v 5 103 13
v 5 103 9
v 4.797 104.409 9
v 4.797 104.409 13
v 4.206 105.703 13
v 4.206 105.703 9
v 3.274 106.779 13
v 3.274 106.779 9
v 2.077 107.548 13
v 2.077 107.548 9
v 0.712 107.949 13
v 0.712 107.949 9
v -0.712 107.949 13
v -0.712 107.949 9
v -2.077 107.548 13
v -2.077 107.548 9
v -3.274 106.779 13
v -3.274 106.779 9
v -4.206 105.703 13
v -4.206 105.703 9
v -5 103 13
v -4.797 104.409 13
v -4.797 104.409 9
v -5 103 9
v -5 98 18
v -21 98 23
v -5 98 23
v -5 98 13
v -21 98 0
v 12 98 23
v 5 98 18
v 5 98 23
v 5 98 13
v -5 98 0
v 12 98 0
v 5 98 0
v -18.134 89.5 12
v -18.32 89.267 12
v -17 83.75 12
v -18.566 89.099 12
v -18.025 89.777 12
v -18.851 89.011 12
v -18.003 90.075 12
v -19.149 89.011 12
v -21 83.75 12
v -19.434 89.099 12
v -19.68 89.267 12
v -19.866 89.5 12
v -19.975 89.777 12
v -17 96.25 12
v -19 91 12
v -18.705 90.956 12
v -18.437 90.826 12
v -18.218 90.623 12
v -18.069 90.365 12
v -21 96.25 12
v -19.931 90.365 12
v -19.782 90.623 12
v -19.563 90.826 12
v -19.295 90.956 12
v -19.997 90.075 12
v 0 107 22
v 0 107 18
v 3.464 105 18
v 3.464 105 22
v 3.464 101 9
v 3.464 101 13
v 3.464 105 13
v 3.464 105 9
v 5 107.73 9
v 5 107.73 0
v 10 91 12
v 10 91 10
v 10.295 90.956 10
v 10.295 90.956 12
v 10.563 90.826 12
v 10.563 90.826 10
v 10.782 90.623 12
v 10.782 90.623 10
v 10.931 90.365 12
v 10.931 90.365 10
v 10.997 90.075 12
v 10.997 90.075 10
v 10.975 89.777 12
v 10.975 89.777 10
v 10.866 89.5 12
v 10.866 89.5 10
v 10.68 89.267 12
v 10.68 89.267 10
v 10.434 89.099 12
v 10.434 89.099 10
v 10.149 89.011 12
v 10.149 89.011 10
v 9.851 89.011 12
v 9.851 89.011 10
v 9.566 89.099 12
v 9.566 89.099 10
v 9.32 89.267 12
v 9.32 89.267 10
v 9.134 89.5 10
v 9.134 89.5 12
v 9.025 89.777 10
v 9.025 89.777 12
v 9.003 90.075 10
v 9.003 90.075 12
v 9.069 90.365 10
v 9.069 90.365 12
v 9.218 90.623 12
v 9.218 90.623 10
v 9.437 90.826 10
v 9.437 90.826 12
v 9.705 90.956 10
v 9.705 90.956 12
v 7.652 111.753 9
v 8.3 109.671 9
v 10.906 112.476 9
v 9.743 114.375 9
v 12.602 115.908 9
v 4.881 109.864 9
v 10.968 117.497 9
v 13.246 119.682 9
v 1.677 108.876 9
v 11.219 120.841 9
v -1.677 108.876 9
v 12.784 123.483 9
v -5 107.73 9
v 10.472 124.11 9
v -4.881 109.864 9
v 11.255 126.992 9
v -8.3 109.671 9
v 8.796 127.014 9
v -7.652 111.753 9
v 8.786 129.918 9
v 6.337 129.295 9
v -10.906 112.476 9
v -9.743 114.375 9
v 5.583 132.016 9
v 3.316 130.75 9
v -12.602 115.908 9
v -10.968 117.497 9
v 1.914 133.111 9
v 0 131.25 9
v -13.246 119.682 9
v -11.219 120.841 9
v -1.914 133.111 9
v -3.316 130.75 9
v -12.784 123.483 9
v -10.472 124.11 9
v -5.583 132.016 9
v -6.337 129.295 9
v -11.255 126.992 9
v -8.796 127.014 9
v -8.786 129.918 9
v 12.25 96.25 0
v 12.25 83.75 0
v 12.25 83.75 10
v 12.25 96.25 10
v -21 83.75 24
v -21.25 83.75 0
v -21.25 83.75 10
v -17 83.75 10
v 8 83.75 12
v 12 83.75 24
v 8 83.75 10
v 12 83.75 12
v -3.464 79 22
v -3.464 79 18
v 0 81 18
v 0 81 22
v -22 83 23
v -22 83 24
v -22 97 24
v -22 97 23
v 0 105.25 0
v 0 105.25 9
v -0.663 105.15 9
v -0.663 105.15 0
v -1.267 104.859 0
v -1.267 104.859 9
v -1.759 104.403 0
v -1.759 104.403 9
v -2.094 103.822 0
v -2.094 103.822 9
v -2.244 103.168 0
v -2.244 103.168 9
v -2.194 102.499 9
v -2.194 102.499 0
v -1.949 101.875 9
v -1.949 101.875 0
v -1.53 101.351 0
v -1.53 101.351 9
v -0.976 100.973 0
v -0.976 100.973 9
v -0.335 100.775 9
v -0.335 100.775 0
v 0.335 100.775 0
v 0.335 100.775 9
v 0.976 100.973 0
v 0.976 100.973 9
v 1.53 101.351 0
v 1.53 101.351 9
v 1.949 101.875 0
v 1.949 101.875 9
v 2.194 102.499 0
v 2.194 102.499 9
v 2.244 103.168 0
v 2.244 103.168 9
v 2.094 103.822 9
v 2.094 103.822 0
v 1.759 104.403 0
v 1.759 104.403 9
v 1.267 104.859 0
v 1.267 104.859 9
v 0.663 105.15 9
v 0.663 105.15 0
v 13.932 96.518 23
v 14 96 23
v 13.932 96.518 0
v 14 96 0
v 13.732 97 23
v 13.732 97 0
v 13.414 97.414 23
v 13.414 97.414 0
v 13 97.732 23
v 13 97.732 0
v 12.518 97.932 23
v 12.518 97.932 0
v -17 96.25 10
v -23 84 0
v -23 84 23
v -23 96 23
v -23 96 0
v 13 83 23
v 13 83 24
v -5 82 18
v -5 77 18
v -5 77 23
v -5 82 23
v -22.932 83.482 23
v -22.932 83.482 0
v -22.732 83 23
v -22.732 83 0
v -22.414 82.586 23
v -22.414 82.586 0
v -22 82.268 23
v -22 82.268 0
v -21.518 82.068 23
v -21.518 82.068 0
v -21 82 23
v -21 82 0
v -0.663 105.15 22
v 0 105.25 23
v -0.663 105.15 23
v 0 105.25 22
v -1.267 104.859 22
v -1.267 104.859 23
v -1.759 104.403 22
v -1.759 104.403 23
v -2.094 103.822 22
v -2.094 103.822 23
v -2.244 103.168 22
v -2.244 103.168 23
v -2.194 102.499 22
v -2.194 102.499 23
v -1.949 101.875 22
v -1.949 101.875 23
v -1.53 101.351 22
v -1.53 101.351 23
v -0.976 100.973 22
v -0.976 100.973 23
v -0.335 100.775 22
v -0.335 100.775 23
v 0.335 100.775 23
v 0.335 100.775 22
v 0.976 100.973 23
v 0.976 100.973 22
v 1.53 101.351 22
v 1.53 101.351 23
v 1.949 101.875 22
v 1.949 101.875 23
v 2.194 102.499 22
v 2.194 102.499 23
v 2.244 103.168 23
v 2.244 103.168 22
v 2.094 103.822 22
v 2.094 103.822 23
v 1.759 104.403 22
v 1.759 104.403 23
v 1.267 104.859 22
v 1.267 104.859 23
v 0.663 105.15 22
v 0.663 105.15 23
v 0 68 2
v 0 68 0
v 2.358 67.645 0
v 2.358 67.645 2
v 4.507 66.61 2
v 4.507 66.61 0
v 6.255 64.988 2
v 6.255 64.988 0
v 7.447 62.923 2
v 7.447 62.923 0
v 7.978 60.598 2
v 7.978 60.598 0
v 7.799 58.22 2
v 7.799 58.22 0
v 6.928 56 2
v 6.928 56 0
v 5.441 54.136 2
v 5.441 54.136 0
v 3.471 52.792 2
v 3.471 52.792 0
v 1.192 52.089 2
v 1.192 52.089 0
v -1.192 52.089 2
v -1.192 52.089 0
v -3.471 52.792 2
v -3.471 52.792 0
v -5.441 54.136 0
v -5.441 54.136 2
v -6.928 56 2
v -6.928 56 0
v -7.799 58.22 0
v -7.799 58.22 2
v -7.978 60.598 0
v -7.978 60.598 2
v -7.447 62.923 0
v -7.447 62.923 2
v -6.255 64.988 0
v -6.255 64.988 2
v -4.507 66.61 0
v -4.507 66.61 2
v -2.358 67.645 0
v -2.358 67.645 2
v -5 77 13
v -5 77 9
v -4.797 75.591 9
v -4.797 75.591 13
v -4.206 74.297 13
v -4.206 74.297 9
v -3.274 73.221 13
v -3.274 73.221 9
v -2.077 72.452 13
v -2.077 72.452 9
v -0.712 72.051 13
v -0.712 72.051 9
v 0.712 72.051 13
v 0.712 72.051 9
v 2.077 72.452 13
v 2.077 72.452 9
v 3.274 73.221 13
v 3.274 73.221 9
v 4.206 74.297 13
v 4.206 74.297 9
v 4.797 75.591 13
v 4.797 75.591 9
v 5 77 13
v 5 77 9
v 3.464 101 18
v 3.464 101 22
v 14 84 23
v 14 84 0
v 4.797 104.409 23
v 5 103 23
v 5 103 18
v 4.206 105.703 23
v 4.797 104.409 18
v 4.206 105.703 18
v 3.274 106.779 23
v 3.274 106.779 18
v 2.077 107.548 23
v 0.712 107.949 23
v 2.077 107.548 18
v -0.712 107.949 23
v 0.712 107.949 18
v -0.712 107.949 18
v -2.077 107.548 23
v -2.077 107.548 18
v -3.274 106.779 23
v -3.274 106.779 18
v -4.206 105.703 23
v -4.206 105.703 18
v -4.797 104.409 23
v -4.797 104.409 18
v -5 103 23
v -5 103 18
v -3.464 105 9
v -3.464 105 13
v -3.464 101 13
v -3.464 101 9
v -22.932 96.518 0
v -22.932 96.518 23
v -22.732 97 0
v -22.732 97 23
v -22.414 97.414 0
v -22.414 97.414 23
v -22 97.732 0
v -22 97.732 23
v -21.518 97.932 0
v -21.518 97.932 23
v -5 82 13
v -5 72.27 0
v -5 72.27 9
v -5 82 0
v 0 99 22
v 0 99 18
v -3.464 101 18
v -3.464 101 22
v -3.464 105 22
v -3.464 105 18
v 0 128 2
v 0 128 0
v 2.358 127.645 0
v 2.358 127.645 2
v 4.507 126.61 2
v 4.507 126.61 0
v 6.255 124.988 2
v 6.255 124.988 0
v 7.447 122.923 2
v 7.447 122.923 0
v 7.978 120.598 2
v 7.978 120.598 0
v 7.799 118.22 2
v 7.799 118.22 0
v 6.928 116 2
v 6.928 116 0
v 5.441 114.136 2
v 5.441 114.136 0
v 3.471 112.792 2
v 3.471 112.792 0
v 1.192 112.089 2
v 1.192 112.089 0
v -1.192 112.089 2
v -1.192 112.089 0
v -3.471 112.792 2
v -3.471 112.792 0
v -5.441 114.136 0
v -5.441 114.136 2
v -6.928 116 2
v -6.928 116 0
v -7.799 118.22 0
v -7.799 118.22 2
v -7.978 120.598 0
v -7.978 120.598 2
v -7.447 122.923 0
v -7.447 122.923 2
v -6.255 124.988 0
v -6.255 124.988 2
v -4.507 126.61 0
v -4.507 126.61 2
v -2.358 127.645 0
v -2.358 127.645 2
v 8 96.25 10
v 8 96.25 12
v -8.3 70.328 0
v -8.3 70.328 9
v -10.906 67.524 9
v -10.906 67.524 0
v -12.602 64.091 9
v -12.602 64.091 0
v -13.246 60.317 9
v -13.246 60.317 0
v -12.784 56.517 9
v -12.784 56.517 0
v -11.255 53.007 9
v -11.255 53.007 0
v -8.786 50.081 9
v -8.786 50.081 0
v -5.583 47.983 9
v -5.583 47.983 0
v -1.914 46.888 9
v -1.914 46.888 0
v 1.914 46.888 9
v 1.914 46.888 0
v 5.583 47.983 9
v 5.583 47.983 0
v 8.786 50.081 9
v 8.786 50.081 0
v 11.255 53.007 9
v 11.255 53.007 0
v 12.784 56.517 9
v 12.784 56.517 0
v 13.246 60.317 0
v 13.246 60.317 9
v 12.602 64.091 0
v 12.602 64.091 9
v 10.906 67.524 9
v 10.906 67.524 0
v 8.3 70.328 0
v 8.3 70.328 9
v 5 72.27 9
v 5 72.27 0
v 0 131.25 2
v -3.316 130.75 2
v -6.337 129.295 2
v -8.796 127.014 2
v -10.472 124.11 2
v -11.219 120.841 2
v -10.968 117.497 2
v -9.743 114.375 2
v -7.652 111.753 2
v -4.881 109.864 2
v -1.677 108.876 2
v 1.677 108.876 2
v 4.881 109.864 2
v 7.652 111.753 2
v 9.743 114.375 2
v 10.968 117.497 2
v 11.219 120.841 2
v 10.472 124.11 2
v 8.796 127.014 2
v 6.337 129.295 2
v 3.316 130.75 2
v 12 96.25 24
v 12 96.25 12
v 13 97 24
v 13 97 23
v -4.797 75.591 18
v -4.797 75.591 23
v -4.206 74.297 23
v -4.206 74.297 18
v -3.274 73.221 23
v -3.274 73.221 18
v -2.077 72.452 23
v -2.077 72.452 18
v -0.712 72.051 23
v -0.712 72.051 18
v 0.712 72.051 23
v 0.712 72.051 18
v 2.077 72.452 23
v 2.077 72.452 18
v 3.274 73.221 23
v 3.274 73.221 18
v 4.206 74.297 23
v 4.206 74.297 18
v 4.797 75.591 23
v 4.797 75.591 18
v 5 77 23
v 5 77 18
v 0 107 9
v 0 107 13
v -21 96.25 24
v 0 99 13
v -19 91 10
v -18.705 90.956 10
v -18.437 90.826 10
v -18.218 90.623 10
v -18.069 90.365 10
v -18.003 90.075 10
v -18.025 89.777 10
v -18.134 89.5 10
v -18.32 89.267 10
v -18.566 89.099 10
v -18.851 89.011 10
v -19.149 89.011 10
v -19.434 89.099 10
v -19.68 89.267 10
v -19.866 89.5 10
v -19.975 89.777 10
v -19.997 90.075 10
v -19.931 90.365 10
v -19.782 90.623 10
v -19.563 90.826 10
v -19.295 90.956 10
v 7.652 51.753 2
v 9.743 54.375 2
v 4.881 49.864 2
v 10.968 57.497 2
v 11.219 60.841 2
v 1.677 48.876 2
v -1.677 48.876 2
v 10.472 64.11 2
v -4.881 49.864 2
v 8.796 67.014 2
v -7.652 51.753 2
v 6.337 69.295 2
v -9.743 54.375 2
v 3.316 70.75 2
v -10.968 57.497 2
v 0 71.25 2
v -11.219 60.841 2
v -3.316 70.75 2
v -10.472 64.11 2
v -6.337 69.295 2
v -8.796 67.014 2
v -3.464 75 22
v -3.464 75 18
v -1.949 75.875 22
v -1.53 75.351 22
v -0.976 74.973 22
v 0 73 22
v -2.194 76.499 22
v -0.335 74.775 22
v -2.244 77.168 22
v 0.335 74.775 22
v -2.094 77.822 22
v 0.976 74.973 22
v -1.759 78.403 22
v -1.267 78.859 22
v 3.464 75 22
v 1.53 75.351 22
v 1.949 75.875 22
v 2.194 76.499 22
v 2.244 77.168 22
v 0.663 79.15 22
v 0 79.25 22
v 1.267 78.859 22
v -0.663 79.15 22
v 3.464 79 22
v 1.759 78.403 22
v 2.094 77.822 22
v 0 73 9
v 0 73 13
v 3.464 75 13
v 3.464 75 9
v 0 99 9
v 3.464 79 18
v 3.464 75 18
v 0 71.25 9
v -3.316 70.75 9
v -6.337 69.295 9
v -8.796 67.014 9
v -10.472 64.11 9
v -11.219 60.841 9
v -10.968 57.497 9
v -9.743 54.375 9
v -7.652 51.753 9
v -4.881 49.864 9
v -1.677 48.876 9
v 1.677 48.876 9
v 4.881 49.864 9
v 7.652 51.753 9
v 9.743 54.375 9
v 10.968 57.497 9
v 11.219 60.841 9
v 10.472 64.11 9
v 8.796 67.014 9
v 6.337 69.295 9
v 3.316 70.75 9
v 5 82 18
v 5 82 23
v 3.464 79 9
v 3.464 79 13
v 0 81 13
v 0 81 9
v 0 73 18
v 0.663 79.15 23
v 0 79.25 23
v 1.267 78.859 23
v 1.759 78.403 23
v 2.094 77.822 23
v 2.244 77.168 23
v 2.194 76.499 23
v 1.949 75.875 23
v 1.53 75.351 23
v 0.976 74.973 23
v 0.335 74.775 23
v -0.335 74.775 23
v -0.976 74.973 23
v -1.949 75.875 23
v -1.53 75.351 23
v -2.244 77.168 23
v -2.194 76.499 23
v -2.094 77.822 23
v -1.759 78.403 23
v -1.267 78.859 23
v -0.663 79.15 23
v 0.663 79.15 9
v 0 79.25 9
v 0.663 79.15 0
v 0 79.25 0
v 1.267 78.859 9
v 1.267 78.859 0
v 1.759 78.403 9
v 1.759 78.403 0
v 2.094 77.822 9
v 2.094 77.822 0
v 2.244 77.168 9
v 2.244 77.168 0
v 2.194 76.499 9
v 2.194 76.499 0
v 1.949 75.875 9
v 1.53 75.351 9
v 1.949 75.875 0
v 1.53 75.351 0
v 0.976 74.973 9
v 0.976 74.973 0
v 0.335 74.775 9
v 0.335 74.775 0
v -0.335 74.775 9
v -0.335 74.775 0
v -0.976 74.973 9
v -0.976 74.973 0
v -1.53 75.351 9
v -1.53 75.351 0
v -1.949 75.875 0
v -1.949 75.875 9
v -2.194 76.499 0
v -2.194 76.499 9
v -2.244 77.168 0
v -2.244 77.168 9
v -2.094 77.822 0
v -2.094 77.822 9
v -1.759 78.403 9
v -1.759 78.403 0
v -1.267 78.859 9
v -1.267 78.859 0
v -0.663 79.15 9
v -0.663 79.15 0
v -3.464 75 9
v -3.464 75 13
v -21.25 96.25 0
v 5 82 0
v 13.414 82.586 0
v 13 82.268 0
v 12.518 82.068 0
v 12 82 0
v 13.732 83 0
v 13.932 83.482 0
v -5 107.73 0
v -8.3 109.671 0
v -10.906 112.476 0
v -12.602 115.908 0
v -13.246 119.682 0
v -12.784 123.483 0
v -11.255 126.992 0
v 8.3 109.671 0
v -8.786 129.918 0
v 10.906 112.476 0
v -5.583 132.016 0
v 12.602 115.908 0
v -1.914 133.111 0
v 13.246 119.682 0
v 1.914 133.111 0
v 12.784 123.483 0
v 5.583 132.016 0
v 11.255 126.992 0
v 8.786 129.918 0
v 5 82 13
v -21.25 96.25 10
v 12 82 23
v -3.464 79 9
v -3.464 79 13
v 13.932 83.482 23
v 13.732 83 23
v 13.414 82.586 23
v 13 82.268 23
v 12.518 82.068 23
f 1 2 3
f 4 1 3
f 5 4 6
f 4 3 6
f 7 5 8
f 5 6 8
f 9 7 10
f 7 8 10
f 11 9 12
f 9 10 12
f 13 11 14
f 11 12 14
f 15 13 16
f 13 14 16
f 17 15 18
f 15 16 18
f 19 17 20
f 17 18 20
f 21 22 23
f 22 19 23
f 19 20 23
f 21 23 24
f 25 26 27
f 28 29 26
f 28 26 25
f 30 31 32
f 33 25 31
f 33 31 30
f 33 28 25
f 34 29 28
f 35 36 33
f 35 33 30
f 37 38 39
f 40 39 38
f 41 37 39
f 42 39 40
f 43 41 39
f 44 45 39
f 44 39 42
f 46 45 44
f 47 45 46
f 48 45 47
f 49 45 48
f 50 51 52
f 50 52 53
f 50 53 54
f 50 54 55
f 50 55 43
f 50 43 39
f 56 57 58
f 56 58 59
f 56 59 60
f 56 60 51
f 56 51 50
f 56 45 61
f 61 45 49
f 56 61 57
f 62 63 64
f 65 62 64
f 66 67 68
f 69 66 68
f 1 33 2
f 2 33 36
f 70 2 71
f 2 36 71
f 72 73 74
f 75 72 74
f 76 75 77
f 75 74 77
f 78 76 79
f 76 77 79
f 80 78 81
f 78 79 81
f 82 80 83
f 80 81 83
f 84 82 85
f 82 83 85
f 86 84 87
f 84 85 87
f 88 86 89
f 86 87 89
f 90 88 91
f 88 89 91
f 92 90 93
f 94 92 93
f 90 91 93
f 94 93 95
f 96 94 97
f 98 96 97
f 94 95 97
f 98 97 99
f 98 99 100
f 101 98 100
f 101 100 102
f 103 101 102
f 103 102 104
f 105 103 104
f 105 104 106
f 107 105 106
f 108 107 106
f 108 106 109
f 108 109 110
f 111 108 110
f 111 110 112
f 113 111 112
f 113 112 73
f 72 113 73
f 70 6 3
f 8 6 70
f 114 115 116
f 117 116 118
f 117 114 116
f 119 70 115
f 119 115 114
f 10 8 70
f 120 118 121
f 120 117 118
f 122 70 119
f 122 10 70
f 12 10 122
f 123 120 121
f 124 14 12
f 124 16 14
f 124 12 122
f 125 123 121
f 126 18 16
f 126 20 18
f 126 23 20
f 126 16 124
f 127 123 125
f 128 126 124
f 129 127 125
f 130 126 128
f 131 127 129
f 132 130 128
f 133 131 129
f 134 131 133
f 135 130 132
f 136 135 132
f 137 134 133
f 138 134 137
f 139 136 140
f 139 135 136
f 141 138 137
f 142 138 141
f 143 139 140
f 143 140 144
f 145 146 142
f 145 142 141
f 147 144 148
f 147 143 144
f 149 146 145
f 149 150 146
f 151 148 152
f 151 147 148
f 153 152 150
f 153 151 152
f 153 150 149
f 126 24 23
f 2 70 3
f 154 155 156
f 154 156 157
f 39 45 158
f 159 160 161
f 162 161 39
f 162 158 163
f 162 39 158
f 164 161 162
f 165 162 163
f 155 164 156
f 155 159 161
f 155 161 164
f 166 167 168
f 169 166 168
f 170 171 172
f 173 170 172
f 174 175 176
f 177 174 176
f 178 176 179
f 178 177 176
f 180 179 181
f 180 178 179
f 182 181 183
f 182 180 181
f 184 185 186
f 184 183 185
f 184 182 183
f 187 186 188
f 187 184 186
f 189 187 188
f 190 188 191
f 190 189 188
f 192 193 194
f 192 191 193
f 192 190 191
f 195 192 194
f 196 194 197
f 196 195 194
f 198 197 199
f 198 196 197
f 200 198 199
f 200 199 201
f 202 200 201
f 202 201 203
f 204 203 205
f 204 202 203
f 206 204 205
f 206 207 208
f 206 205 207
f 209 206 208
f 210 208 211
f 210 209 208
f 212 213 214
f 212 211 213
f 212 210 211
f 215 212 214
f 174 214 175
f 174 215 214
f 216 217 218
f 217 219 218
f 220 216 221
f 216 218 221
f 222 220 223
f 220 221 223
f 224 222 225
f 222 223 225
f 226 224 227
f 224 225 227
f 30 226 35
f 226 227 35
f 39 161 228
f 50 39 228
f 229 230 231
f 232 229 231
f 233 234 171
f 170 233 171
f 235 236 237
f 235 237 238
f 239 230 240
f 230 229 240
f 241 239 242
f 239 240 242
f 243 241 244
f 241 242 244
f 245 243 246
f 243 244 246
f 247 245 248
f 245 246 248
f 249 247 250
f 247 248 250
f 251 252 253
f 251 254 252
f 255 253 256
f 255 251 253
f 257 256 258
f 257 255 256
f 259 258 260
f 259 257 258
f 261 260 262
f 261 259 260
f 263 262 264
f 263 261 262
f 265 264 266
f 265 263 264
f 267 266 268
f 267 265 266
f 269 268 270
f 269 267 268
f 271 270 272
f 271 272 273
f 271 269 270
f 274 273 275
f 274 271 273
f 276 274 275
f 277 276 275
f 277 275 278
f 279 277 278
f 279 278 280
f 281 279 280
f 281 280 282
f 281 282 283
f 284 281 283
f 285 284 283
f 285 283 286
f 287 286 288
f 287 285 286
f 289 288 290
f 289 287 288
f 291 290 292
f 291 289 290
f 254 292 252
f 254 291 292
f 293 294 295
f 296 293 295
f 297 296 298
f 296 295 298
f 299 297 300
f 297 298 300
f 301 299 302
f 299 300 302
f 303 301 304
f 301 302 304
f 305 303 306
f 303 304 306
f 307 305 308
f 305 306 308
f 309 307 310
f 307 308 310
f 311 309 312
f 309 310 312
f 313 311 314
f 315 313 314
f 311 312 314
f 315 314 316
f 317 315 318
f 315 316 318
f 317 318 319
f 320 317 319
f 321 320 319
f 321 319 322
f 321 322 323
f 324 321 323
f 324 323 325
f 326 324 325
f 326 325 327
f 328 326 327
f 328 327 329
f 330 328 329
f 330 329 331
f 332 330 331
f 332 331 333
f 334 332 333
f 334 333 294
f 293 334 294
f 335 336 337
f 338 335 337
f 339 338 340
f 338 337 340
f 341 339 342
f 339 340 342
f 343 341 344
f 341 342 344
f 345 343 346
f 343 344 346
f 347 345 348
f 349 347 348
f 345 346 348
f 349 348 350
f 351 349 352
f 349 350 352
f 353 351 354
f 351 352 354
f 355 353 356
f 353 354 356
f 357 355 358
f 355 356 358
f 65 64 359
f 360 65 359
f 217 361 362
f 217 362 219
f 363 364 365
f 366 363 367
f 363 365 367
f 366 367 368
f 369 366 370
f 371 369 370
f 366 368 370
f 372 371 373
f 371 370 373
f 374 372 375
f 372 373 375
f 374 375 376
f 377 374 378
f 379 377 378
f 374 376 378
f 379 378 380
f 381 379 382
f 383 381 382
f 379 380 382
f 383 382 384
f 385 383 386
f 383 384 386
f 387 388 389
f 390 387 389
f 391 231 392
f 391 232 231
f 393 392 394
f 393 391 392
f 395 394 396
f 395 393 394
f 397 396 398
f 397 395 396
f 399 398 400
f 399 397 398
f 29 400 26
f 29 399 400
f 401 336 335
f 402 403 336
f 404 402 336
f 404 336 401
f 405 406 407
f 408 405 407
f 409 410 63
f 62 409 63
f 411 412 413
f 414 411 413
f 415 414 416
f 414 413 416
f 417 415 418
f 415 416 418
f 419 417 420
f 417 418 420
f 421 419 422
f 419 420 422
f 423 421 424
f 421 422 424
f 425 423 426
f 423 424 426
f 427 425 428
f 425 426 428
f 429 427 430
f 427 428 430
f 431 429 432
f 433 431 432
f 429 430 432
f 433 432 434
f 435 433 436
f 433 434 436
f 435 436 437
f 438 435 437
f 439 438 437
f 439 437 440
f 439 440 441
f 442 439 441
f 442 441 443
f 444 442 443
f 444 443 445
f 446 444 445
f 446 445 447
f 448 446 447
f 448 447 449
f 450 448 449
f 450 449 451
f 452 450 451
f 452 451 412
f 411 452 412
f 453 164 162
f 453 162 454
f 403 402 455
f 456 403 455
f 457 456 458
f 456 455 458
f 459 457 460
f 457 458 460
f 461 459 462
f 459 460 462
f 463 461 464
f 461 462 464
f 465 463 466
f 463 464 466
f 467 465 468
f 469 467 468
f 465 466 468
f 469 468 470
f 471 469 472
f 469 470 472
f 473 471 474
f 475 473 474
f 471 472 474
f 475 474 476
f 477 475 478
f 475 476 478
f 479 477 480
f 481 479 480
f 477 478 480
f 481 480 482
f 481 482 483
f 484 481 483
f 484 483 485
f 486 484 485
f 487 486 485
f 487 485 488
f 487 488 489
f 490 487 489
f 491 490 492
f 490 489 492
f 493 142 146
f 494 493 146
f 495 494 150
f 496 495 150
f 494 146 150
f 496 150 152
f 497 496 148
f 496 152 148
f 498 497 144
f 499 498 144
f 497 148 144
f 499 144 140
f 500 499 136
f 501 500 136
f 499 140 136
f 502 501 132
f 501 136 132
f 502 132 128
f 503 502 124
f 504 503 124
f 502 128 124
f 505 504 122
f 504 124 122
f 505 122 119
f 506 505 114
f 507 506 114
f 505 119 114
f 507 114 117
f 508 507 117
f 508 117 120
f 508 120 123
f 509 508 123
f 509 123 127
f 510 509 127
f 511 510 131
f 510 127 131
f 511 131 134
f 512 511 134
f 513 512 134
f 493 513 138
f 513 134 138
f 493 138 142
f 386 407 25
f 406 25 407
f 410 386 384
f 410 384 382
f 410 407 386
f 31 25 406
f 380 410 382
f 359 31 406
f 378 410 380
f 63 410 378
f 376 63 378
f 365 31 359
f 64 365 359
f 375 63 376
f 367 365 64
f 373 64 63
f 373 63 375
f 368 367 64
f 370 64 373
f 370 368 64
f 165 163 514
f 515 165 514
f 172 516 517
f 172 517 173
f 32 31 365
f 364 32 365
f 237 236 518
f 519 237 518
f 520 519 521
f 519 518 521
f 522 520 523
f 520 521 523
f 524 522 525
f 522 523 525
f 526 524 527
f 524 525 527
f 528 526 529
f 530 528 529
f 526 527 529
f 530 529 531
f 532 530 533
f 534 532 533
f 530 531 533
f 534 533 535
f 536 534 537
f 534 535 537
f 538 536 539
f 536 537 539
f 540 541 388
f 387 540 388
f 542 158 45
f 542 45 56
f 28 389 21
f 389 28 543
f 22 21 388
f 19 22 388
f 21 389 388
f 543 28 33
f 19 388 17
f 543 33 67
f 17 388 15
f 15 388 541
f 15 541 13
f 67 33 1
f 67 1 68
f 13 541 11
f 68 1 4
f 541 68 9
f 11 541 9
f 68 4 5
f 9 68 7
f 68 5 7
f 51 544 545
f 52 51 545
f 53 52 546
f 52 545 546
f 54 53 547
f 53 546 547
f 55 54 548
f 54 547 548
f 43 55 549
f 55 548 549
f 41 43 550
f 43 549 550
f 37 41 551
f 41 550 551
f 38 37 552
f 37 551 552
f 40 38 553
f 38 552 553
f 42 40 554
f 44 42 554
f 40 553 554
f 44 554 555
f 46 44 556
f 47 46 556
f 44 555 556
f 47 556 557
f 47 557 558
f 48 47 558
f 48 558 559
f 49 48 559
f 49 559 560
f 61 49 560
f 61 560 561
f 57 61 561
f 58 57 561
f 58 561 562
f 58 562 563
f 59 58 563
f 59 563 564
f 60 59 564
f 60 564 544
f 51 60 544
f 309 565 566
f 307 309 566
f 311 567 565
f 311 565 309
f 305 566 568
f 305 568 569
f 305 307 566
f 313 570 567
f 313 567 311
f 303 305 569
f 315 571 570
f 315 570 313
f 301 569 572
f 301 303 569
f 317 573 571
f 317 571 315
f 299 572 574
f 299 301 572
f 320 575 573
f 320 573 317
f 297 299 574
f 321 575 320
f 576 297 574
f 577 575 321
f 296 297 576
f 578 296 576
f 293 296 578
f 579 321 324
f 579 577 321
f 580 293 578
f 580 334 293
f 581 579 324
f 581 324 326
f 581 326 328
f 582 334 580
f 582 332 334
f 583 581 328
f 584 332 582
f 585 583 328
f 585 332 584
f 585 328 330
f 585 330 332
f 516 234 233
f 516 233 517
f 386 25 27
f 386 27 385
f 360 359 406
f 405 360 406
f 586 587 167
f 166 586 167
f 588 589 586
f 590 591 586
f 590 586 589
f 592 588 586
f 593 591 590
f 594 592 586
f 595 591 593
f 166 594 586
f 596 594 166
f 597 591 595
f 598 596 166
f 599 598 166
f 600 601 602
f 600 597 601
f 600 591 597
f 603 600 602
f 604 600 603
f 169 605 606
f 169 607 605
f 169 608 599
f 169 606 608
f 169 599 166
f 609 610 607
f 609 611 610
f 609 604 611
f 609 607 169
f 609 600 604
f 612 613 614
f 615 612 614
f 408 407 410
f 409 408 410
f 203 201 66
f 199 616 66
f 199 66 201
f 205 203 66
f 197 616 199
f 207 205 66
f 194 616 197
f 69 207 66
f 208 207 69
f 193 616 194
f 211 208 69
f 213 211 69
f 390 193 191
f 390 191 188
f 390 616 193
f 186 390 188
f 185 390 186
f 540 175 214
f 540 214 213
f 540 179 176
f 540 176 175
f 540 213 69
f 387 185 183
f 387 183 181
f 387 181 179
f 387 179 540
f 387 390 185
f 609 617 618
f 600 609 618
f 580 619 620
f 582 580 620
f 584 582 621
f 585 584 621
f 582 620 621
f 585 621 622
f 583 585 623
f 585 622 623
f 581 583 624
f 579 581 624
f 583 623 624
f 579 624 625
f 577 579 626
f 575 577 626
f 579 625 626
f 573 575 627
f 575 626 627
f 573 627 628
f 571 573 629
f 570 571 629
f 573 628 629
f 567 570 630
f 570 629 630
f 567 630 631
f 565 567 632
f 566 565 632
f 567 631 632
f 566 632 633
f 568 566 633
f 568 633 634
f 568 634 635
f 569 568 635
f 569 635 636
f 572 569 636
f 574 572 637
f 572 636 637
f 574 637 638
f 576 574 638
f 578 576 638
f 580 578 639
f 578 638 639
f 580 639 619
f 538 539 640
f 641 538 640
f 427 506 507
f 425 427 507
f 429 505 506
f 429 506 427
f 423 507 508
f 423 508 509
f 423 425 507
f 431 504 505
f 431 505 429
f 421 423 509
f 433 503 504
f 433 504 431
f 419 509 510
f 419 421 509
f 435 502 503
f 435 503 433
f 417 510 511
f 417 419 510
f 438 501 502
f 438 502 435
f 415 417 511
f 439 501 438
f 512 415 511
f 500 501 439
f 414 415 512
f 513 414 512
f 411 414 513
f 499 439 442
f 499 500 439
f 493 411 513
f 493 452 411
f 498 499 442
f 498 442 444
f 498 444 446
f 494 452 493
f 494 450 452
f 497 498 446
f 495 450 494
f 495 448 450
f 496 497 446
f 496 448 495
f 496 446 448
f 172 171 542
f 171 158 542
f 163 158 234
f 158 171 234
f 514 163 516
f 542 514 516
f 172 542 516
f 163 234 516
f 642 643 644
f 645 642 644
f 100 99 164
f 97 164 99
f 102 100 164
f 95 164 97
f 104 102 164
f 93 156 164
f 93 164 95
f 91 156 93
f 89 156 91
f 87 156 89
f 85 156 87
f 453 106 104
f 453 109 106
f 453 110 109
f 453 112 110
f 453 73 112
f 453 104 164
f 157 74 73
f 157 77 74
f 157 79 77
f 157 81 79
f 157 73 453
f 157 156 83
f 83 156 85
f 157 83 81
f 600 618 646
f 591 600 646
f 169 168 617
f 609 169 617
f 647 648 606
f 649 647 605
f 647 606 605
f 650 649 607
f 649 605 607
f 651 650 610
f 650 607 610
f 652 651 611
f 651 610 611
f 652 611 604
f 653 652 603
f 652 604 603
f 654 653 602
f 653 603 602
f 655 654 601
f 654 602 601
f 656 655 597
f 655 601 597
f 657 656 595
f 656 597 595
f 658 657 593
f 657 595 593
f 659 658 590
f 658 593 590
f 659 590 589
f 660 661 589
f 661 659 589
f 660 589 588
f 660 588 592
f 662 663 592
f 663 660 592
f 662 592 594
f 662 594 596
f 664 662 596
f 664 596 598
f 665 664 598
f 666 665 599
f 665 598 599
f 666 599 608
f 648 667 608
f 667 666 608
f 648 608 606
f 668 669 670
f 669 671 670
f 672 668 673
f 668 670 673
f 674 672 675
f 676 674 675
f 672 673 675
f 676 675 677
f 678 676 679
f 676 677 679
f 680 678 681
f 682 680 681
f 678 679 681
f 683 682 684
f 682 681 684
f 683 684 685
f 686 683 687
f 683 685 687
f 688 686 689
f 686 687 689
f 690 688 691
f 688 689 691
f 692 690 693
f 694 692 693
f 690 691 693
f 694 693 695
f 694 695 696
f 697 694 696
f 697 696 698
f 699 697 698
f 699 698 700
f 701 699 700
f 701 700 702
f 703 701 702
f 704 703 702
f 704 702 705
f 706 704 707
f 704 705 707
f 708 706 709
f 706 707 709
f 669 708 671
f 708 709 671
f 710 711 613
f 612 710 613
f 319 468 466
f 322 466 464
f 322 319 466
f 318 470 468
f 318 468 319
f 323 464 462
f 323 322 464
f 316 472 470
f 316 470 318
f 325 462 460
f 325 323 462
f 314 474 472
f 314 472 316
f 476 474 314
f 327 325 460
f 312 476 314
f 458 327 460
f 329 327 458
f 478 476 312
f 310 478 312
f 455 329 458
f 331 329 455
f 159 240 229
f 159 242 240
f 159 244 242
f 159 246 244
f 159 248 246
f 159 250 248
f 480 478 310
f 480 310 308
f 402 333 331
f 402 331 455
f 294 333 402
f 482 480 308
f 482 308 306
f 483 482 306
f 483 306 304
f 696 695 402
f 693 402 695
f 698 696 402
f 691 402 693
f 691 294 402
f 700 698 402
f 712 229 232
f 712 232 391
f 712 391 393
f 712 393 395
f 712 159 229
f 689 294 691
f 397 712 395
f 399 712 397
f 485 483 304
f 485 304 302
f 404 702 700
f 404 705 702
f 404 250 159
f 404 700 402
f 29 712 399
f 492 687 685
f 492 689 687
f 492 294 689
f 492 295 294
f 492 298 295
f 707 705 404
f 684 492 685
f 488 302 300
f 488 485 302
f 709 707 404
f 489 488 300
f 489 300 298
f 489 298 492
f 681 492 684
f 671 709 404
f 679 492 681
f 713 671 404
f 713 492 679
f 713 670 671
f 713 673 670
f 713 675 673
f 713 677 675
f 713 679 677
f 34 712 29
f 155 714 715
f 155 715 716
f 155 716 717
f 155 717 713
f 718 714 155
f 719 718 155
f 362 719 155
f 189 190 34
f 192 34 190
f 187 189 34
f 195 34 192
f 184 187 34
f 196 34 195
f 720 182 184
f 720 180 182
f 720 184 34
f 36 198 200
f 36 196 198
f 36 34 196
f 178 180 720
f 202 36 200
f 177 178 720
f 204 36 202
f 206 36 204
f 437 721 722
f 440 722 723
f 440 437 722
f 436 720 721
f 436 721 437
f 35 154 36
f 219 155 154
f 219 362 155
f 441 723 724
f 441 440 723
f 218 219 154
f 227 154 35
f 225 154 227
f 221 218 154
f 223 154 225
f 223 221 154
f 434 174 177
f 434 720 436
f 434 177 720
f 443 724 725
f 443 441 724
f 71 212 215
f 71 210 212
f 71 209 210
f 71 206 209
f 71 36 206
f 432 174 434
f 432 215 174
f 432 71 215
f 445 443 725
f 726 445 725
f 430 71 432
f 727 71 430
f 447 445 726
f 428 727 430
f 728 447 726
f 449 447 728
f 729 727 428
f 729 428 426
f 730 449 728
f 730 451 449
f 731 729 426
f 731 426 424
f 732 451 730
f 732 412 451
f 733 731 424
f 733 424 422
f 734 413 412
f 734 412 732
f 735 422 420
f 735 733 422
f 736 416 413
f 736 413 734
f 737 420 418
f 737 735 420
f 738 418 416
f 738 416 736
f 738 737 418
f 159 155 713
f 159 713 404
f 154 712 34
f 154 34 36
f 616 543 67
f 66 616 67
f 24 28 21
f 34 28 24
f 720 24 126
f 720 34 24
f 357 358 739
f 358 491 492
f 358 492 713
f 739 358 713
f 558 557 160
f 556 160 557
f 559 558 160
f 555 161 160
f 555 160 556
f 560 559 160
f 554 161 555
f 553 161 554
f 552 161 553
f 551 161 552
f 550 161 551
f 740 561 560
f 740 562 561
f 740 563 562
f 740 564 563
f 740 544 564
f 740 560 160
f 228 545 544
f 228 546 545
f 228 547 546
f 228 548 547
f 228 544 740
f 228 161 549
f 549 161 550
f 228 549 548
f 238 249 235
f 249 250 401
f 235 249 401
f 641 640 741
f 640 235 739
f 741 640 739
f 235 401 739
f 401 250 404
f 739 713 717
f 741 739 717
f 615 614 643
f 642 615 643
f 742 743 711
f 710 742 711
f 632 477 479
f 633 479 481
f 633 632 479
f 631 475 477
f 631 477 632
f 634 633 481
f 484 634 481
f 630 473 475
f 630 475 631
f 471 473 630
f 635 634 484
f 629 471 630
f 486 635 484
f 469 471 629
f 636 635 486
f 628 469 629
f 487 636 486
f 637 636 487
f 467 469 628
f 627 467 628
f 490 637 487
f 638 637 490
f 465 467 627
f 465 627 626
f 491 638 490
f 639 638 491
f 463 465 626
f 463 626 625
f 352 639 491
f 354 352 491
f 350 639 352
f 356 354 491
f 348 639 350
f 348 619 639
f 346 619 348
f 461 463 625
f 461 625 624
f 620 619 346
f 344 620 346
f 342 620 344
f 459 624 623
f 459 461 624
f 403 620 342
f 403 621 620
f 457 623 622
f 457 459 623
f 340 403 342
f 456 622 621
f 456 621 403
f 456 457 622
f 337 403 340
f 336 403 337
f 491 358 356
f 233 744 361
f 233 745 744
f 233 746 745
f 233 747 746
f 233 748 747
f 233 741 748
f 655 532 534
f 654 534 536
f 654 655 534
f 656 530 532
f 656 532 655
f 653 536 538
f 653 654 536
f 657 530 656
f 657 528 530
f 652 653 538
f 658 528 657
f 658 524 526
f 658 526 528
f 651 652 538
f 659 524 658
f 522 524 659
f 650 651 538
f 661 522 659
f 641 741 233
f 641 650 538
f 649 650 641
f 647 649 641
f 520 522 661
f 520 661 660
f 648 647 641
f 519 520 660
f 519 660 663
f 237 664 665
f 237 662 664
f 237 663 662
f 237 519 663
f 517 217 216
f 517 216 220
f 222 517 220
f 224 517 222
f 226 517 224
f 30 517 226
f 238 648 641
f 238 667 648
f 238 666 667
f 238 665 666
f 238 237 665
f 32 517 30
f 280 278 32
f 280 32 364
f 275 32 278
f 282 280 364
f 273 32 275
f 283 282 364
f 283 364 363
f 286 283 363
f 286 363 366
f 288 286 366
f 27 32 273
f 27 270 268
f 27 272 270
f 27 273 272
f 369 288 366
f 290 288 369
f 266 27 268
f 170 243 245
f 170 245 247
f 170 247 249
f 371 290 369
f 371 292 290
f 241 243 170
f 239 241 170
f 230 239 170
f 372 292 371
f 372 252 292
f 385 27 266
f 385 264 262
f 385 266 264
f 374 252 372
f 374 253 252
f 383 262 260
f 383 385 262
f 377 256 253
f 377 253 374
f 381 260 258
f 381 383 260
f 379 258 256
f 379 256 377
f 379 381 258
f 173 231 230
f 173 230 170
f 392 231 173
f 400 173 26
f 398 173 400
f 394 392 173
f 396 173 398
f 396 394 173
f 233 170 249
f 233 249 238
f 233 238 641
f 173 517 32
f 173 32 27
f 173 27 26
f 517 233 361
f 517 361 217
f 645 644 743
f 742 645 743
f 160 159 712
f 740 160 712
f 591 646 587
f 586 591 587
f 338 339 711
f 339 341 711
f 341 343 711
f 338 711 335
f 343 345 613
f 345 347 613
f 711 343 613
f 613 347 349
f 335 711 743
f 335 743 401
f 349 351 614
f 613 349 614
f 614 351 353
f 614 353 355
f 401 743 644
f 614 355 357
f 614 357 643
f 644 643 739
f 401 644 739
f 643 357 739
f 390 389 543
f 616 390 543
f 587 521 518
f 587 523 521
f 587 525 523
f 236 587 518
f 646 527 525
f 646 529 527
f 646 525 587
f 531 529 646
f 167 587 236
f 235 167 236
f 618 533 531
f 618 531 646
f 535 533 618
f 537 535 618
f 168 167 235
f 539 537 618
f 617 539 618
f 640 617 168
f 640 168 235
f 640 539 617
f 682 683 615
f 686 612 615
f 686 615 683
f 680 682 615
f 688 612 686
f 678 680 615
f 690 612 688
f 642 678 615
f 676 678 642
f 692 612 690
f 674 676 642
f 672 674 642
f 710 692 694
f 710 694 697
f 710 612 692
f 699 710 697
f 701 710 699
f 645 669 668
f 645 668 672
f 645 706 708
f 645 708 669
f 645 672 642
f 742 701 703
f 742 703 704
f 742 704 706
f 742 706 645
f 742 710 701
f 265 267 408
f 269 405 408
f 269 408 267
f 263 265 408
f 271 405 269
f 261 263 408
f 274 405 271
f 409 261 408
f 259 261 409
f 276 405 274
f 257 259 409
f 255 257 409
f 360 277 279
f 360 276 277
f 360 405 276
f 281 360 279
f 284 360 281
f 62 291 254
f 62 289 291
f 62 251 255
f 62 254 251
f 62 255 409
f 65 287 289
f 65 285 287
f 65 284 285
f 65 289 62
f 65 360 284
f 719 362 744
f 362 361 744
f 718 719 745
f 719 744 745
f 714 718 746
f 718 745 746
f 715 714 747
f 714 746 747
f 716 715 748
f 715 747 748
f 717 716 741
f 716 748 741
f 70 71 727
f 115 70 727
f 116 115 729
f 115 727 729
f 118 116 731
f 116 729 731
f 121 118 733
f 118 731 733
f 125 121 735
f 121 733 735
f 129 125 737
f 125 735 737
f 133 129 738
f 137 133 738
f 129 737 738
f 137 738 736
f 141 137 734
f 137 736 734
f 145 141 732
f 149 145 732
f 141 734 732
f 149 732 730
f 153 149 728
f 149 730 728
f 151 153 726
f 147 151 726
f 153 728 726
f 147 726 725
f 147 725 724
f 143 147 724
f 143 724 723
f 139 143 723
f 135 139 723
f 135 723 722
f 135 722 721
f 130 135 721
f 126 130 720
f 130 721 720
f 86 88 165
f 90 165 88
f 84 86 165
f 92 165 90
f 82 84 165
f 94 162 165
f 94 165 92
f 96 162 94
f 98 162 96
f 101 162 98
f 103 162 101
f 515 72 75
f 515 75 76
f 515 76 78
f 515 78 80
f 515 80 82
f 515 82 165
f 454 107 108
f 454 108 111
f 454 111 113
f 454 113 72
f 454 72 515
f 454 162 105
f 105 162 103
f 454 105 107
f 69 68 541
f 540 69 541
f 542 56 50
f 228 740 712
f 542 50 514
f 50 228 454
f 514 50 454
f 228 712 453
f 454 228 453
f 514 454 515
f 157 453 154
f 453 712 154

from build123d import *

# Parameters (mm, degrees)
PAD013_DEPTH            = 9
SKETCH034_R             = 11.25
POCKET003_DEPTH         = 7
SKETCH035_R             = 8
POCKET004_DEPTH         = 5
SKETCH040_W             = 16
SKETCH040_H             = 37
PAD016_DEPTH            = 24
SKETCH042_W             = 16
SKETCH042_H             = 7
PAD017_DEPTH            = 12
SKETCH043_W             = 12.5
SKETCH043_H             = 5.25
POCKET008_DEPTH         = 10
SKETCH044_R             = 1
POCKET009_DEPTH         = 4
POCKET009_DEPTH_BACK    = 5
SKETCH045_W             = 12.5
SKETCH045_H             = 25
POCKET010_DEPTH         = 50
SKETCH071_R             = 2.25
PAD027_DEPTH            = 14
SKETCH072_R             = 2.25
POCKET026_DEPTH         = 10
SKETCH073_W             = 16
SKETCH073_H             = 37
SKETCH073_W_2           = 14
SKETCH073_H_2           = 35
POCKET035_DEPTH         = 1
SKETCH084_W             = 10
SKETCH084_H             = 5
POCKET036_DEPTH         = 10
POCKET037_DEPTH         = 4
POCKET038_DEPTH         = 4
SKETCH133_W             = 12.5
SKETCH133_H             = 33
POCKET053_DEPTH         = 12
FILLET_R                = 2
BODY004_PLACEMENT_ANGLE = 90


with BuildPart() as part:
    # Sketch033 → Pad013 (new body)
    with BuildSketch(Plane.XY):
        with BuildLine():
            ThreePointArc((12.269609, 5), (-13.250782, 0), (12.269609, -5))
            Line((12.269609, -5), (47.729609, -5))
            ThreePointArc((47.729609, -5), (73.25, 0), (47.729609, 5))
            Line((12.269609, 5), (47.729609, 5))
        make_face()
    extrude(amount=PAD013_DEPTH)

    # Sketch034 (on Face6 of Pad013) → Pocket003 (cut)
    with BuildSketch(Plane.XY.offset(9)):
        Circle(SKETCH034_R)
        with Locations((60, 0)):
            Circle(SKETCH034_R)
    extrude(amount=-POCKET003_DEPTH, mode=Mode.SUBTRACT)

    # Sketch035 (on Face4 of Pocket003) → Pocket004 (cut)
    with BuildSketch(Plane(origin=(0, 0, 0), x_dir=(1, 0, 0), z_dir=(0, 0, -1))):
        Circle(SKETCH035_R)
        with Locations((60, 0)):
            Circle(SKETCH035_R)
    extrude(amount=-POCKET004_DEPTH, mode=Mode.SUBTRACT)

    # Sketch040 (on Face4 of Pocket004) → Pad016 (join)
    with BuildSketch(Plane(origin=(0, 0, 0), x_dir=(1, 0, 0), z_dir=(0, 0, -1))):
        with Locations((30, -4.5)):
            Rectangle(SKETCH040_W, SKETCH040_H)
    extrude(amount=-PAD016_DEPTH)

    # Sketch042 → Pad017 (join)
    with BuildSketch(Plane(origin=(0, 0, 0), x_dir=(1, 0, 0), z_dir=(0, 0, -1))):
        with Locations((30, -19.5)):
            Rectangle(SKETCH042_W, SKETCH042_H)
        with Locations((30, 10.5)):
            Rectangle(SKETCH042_W, SKETCH042_H)
    extrude(amount=-PAD017_DEPTH)

    # Sketch043 (on Face4 of Pad017) → Pocket008 (cut)
    with BuildSketch(Plane(origin=(0, 0, 0), x_dir=(1, 0, 0), z_dir=(0, 0, -1))):
        with Locations((30, 9.625)):
            Rectangle(SKETCH043_W, SKETCH043_H)
        with Locations((30, -18.625)):
            Rectangle(SKETCH043_W, SKETCH043_H)
    extrude(amount=-POCKET008_DEPTH, mode=Mode.SUBTRACT)

    # Sketch044 (on Face40 of Pocket008) → Pocket009 (cut, two sides)
    with BuildSketch(Plane(origin=(0, 0, 10), x_dir=(1, 0, 0), z_dir=(0, 0, -1))) as pocket009_sk:
        with Locations((30, -19)):
            Circle(SKETCH044_R)
        with Locations((30, 10)):
            Circle(SKETCH044_R)
    extrude(amount=-POCKET009_DEPTH, mode=Mode.SUBTRACT)
    extrude(pocket009_sk.sketch, amount=POCKET009_DEPTH_BACK, mode=Mode.SUBTRACT)

    # Sketch045 (on Face17 of Pocket009) → Pocket010 (cut)
    with BuildSketch(Plane(origin=(0, 0, 0), x_dir=(1, 0, 0), z_dir=(0, 0, -1))):
        with Locations((30, -4.5)):
            Rectangle(SKETCH045_W, SKETCH045_H)
    extrude(amount=-POCKET010_DEPTH, mode=Mode.SUBTRACT)

    # Sketch071 → Pad027 (join)
    with BuildSketch(Plane.XY.offset(9)):
        with BuildLine():
            ThreePointArc((43, -5), (48, 1e-05), (42.999979, 5))
            Line((37, 5), (42.999979, 5))
            Line((37, 5), (37, -5))
            Line((37, -5), (43, -5))
        make_face()
        with Locations((43, 0)):
            Circle(SKETCH071_R, mode=Mode.SUBTRACT)
        with BuildLine():
            ThreePointArc((17, 5), (12, 0), (17, -5))
            Line((23, -5), (17, -5))
            Line((23, 5), (23, -5))
            Line((17, 5), (23, 5))
        make_face()
        with Locations((17, 0)):
            Circle(SKETCH071_R, mode=Mode.SUBTRACT)
    extrude(amount=PAD027_DEPTH)

    # Sketch072 (on Face4 of Pad027) → Pocket026 (cut)
    with BuildSketch(Plane(origin=(0, 0, 0), x_dir=(1, 0, 0), z_dir=(0, 0, -1))):
        with Locations((17, 0)):
            Circle(SKETCH072_R)
        with Locations((43, 0)):
            Circle(SKETCH072_R)
    extrude(amount=-POCKET026_DEPTH, mode=Mode.SUBTRACT)

    # Sketch073 (on Face19 of Pocket026) → Pocket035 (cut)
    with BuildSketch(Plane.XY.offset(24)):
        with Locations((30, 4.5)):
            Rectangle(SKETCH073_W, SKETCH073_H)
        with Locations((30, 4.5)):
            Rectangle(SKETCH073_W_2, SKETCH073_H_2, mode=Mode.SUBTRACT)
    extrude(amount=-POCKET035_DEPTH, mode=Mode.SUBTRACT)

    # Sketch084 (on Face9 of Pocket035) → Pocket036 (cut)
    with BuildSketch(Plane.XZ.offset(5)):
        with Locations((17, 15.5)):
            Rectangle(SKETCH084_W, SKETCH084_H)
        with Locations((43, 15.5)):
            Rectangle(SKETCH084_W, SKETCH084_H)
    extrude(amount=-POCKET036_DEPTH, mode=Mode.SUBTRACT)

    # Sketch085 (on Face21 of Pocket036) → Pocket037 (cut)
    with BuildSketch(Plane.XY.offset(13)):
        Polygon((13, 0), (15, -3.464102), (19, -3.464102), (21, 0), (19, 3.464102), (15, 3.464102), align=None)
        Polygon((39, 0), (41, -3.464102), (45, -3.464102), (47, 0), (45, 3.464102), (41, 3.464102), align=None)
    extrude(amount=-POCKET037_DEPTH, mode=Mode.SUBTRACT)

    # Sketch086 (on Face30 of Pocket037) → Pocket038 (cut)
    with BuildSketch(Plane(origin=(0, 0, 18), x_dir=(1, 0, 0), z_dir=(0, 0, -1))):
        Polygon((13, 0), (15, -3.464102), (19, -3.464102), (21, 0), (19, 3.464102), (15, 3.464102), align=None)
        Polygon((39, 0), (41, -3.464102), (45, -3.464102), (47, 0), (45, 3.464102), (41, 3.464102), align=None)
    extrude(amount=-POCKET038_DEPTH, mode=Mode.SUBTRACT)

    # Sketch133 (on Face52 of Pocket038) → Pocket053 (cut)
    with BuildSketch(Plane.XY.offset(24)):
        with Locations((30, 4.5)):
            Rectangle(SKETCH133_W, SKETCH133_H)
    extrude(amount=-POCKET053_DEPTH, mode=Mode.SUBTRACT)

    # Fillet
    fillet_edges = [part.edges().sort_by_distance(p)[0] for p in [
        (38, -14, 6),
        (38, -14, 17.5),
        (22, -14, 17.5),
        (22, -14, 6),
        (22, 23, 17.5),
        (22, 23, 6),
        (38, 23, 6),
        (38, 23, 17.5),
    ]]
    fillet(fillet_edges, radius=FILLET_R)


with BuildPart() as part_1:
    # Body004 placement: moved
    add(part.part.moved(Location((0, 60, 0))).rotate(Axis((0, 60, 0), (0, 0, 1)), BODY004_PLACEMENT_ANGLE))


solid = part_1.part
